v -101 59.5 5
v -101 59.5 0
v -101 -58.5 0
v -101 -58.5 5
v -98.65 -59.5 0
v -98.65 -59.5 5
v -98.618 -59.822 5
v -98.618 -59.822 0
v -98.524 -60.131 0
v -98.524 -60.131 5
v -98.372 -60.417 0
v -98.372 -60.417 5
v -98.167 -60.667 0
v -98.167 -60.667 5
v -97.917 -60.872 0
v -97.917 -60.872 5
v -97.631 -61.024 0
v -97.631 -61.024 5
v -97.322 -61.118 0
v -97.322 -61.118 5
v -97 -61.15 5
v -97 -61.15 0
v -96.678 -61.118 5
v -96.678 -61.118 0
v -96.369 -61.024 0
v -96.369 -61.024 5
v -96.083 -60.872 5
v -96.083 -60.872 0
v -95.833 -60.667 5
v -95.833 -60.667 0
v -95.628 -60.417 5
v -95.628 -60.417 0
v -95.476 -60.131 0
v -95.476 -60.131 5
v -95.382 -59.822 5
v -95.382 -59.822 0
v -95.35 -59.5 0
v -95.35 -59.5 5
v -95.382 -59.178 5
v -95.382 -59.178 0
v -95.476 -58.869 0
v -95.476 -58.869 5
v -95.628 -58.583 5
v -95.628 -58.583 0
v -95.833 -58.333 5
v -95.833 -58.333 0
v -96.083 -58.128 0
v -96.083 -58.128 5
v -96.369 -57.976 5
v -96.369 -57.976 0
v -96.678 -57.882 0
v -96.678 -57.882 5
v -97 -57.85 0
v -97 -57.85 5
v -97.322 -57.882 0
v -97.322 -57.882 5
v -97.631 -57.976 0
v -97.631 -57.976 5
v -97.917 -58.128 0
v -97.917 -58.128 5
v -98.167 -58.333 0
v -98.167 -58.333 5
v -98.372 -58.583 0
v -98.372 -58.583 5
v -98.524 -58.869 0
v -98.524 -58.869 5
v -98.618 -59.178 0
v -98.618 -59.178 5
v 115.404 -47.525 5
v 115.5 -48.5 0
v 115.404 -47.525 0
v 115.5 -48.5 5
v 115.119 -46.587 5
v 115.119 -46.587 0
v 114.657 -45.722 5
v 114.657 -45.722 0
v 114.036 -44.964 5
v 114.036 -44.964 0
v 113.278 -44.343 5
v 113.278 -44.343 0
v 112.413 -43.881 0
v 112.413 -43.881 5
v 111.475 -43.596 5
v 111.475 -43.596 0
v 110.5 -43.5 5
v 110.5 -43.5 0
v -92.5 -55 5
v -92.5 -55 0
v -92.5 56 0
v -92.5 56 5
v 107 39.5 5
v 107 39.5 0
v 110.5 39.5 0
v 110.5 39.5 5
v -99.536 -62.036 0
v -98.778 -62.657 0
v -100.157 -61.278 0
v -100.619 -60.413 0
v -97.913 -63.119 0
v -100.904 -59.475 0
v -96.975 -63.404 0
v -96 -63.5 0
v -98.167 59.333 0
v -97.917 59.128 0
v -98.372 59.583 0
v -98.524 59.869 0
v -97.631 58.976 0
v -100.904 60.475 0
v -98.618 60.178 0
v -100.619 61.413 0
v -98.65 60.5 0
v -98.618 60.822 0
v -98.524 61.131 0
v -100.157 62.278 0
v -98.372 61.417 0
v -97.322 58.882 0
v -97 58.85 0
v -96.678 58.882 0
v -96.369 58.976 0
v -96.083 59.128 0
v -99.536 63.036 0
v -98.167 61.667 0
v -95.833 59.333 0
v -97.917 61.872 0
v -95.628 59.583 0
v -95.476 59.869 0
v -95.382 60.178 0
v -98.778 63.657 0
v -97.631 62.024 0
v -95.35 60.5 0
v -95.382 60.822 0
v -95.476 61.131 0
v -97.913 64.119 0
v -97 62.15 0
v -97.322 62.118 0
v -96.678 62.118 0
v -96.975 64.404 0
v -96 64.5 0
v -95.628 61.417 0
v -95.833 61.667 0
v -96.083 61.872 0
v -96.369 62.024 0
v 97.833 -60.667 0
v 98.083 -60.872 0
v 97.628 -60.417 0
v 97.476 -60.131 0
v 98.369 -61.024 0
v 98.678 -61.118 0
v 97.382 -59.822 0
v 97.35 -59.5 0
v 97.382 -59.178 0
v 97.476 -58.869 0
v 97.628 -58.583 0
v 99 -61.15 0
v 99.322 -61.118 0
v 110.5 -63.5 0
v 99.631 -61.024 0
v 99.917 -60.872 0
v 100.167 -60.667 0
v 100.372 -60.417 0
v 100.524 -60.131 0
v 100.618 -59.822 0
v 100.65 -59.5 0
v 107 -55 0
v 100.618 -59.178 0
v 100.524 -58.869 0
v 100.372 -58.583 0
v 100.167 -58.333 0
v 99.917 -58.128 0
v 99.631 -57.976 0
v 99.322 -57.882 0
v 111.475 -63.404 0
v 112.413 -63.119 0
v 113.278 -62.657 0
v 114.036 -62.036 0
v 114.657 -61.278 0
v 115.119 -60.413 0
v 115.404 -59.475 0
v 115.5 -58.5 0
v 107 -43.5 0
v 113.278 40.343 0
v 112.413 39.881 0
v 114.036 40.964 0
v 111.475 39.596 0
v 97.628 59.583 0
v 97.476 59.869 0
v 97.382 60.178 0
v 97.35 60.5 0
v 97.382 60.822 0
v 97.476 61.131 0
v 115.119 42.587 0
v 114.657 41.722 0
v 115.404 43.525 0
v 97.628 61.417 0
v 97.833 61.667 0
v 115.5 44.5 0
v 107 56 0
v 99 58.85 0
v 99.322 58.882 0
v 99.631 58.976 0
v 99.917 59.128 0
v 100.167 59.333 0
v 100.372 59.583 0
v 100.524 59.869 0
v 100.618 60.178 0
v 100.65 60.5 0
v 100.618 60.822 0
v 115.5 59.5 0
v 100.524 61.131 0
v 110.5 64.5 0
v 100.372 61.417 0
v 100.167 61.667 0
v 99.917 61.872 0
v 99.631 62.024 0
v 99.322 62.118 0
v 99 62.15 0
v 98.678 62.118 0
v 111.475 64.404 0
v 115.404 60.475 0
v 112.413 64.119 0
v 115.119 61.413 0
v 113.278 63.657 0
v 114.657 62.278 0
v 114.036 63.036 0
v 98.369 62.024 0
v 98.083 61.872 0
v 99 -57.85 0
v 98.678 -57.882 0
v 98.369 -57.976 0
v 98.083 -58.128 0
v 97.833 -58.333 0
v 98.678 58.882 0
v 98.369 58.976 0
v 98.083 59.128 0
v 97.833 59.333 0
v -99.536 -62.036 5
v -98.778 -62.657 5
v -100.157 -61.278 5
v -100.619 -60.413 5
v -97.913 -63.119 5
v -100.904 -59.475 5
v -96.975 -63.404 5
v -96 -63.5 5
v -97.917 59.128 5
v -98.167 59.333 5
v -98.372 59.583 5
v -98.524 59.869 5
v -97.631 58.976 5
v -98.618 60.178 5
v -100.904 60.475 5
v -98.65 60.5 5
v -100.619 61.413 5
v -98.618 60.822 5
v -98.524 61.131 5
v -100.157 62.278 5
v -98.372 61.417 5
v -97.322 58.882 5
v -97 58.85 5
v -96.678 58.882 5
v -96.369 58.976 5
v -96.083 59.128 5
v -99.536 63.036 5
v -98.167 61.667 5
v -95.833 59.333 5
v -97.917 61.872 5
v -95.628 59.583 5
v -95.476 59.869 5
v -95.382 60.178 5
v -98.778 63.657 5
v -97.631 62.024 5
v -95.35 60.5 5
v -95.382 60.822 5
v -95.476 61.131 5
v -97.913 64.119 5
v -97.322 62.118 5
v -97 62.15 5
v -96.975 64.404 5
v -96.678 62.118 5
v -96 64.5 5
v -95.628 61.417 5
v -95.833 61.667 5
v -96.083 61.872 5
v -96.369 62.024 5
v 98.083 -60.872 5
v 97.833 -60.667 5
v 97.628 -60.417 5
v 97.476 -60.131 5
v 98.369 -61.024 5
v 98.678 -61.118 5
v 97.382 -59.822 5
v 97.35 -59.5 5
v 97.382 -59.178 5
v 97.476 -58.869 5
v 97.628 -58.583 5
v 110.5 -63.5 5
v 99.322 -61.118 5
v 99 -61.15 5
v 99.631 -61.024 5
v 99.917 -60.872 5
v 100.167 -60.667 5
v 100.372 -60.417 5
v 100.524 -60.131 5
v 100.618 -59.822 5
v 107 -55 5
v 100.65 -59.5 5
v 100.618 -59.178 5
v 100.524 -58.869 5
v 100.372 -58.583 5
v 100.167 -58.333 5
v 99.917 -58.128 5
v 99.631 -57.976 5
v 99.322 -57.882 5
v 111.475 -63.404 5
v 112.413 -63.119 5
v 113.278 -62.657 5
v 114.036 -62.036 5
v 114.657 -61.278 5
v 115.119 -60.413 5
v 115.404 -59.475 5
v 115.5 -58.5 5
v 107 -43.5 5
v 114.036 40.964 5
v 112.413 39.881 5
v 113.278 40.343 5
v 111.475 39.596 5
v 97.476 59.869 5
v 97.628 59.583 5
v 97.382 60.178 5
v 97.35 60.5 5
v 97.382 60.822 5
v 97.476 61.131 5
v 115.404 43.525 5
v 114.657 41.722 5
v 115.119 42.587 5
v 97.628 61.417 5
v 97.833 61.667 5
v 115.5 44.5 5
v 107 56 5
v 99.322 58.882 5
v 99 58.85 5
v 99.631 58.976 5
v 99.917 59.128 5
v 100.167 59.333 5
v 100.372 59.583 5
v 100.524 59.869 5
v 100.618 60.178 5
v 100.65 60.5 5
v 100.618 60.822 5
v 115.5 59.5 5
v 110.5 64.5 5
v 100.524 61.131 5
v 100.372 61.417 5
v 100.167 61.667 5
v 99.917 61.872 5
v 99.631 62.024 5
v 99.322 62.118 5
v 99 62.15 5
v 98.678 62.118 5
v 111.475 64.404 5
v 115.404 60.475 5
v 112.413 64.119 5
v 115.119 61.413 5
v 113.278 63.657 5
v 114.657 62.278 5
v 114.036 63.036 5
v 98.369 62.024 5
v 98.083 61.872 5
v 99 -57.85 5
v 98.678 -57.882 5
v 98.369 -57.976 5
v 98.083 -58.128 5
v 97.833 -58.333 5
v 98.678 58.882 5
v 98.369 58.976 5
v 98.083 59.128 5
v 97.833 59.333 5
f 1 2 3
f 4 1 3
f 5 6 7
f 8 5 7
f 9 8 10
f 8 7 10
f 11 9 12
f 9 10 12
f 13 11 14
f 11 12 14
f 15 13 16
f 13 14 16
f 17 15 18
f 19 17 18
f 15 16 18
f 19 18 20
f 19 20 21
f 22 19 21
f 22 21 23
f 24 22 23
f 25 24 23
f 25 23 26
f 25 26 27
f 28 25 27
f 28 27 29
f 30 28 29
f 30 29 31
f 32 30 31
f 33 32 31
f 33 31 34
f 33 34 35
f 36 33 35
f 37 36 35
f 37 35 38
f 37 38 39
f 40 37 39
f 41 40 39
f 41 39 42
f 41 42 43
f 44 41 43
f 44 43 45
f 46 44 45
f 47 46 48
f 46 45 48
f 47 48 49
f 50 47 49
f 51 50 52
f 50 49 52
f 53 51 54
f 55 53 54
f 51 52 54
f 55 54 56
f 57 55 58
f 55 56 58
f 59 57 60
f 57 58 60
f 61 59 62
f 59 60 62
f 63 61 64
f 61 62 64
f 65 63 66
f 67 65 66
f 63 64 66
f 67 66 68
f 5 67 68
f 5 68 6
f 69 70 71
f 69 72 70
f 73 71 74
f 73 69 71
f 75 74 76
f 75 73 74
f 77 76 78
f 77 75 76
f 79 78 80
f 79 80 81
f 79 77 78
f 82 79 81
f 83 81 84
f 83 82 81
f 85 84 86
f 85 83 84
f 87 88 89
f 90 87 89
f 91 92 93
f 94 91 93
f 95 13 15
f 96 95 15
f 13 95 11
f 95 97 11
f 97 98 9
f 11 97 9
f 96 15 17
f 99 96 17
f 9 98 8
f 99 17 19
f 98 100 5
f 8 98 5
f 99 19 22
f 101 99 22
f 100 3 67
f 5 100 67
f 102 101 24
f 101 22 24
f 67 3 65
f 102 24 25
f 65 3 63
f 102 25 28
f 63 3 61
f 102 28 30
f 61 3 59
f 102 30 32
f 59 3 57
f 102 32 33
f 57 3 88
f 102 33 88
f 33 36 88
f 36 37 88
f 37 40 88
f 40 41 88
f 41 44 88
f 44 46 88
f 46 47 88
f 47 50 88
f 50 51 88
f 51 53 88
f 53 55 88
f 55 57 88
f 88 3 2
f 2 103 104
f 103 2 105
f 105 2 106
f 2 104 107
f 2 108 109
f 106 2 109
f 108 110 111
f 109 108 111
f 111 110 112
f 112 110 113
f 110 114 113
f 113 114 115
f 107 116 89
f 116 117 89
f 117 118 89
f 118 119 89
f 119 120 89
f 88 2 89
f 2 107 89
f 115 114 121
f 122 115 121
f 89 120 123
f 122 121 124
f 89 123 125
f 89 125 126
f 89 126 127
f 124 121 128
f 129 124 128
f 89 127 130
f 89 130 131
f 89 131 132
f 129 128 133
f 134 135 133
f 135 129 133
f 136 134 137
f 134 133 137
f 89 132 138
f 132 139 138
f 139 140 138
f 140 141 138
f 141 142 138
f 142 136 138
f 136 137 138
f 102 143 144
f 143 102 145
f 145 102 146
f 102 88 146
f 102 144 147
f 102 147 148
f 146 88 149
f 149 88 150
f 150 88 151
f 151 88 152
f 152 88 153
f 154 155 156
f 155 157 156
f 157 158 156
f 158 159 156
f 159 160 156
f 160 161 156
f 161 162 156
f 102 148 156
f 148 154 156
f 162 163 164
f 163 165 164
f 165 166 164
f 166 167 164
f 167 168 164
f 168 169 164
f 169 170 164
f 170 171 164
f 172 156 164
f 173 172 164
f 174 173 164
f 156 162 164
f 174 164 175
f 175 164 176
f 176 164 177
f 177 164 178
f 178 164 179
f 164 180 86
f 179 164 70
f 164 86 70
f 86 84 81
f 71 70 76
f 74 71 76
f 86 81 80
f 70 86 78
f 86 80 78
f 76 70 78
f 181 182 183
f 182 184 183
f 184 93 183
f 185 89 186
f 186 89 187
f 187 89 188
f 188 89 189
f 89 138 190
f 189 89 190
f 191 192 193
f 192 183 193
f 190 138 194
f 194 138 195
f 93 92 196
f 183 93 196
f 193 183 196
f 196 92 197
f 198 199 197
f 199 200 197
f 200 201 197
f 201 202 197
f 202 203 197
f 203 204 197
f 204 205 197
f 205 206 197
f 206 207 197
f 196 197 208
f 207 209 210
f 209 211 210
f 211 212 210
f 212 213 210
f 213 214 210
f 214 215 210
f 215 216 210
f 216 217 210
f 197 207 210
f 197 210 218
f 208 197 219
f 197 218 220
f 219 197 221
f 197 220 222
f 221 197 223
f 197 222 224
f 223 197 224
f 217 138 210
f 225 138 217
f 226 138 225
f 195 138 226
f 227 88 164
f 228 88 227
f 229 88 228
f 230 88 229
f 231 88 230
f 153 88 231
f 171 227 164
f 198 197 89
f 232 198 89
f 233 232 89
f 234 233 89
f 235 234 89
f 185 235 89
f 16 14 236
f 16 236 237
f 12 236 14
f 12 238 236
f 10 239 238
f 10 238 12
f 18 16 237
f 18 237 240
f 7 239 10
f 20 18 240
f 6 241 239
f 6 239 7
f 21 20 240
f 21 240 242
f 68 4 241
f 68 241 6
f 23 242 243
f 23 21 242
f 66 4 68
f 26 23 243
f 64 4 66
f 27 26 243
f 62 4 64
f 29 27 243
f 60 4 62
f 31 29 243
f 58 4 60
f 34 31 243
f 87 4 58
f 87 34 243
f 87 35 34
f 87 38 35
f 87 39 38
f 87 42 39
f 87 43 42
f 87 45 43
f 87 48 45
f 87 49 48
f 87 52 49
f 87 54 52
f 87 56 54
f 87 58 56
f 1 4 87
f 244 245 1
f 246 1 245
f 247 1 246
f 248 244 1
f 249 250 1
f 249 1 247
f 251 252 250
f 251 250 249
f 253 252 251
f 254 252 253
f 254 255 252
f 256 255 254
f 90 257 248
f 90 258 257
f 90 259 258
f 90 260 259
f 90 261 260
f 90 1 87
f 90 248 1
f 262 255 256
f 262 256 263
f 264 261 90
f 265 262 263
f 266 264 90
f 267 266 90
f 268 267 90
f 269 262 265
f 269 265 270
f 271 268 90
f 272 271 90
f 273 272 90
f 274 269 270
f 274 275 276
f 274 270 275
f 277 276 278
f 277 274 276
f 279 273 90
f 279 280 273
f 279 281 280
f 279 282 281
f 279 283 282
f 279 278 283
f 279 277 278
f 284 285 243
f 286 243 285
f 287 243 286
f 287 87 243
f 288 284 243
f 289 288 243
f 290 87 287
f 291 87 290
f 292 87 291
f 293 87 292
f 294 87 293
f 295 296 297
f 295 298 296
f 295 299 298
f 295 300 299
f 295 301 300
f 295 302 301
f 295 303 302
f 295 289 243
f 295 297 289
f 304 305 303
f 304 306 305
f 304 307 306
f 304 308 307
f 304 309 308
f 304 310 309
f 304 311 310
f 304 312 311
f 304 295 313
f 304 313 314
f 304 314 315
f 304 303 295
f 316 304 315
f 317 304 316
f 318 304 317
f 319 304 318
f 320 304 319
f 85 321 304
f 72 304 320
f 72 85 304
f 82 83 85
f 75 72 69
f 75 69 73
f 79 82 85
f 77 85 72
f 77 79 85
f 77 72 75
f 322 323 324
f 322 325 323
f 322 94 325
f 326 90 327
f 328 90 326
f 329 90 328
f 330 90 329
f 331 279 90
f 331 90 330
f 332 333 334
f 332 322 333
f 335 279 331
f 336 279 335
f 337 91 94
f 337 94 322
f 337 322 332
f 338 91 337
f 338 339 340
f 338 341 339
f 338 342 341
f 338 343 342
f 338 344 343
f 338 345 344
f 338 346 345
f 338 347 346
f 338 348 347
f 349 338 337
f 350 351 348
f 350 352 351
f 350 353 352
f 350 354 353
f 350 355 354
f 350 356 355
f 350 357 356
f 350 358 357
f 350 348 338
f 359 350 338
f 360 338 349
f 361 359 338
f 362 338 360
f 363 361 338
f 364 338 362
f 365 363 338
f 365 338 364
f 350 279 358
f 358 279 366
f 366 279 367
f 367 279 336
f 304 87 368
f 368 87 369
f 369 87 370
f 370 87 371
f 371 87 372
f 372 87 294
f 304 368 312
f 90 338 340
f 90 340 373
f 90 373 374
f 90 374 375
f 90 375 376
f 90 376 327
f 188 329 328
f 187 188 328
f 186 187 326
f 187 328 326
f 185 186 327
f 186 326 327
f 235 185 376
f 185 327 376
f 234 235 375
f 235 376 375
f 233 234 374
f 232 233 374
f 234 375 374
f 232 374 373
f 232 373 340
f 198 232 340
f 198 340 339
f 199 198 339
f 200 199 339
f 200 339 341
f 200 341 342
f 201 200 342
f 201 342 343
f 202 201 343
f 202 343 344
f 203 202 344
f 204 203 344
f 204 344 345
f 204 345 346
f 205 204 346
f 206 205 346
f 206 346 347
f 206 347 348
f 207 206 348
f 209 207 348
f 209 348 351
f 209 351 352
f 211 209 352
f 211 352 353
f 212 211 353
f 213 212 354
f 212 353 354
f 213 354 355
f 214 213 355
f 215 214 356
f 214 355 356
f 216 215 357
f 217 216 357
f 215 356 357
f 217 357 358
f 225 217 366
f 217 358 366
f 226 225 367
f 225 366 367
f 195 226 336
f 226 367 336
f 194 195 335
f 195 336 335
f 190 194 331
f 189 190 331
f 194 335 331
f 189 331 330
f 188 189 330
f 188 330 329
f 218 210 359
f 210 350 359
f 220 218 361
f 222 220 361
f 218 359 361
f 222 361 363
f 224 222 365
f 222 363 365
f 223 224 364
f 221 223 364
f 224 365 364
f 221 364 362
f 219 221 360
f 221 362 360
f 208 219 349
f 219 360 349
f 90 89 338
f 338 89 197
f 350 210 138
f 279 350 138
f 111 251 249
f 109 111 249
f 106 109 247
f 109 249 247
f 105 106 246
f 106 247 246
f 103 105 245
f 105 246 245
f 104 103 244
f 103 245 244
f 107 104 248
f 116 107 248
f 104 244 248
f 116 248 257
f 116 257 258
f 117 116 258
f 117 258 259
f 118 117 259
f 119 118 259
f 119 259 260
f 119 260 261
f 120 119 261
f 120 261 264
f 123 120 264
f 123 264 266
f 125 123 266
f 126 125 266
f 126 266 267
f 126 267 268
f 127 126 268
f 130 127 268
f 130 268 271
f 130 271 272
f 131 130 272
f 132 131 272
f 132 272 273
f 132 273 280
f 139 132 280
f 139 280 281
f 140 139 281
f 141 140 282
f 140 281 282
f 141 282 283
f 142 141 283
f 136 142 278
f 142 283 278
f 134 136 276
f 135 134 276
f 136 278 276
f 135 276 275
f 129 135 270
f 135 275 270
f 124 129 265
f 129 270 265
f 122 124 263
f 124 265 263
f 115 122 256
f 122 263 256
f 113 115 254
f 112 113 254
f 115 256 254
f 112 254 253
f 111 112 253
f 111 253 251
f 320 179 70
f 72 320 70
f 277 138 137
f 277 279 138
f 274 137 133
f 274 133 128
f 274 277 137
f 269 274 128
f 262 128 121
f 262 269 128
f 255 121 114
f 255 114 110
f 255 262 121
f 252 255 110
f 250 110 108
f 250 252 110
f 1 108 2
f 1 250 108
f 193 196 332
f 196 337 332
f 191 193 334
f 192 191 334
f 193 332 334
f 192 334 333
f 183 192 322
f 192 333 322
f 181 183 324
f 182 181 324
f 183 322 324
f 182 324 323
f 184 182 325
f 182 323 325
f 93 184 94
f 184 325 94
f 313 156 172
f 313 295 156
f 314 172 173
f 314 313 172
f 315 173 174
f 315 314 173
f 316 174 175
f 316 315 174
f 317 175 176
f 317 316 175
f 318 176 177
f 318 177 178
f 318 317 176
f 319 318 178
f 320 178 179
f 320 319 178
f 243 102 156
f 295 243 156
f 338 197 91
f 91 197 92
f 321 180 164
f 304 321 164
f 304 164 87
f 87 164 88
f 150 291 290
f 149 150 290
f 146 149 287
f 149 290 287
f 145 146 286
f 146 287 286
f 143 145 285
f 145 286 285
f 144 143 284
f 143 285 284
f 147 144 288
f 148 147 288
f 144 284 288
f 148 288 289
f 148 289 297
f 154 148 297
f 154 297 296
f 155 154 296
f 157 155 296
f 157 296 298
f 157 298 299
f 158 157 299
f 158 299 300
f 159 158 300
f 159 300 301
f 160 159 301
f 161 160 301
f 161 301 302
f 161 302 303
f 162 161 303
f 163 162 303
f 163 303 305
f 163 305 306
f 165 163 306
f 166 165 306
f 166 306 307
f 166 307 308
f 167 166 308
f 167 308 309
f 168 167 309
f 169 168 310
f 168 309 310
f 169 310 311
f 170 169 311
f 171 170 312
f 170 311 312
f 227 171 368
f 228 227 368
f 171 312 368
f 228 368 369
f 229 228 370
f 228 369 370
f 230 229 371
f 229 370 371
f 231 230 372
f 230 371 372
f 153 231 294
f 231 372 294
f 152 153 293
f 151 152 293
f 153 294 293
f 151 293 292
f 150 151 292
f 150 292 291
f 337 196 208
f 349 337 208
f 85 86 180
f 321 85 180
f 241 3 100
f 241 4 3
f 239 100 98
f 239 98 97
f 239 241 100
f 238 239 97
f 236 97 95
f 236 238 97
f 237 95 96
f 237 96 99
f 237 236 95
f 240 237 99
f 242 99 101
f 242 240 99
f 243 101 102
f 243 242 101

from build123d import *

# Parameters (mm, degrees)
F1_DEPTH = 5
F2_D     = 3.3
F3_R     = 5


with BuildPart() as f1:
    # F0 (on Top) → F1 (new body)
    with BuildSketch(Plane.XY):
        Polygon((115.4999993443, 64.5), (103, 64.5), (-101, 64.5), (-101, -63.5), (103, -63.5), (115.4999993443, -63.5), (115.4999993443, -43.5), (106.9999993443, -43.5), (106.9999993443, -55), (103, -55), (-92.5, -55), (-92.5, 56), (103, 56), (106.9999993443, 56), (106.9999993443, 39.5), (115.4999993443, 39.5), align=None)
    extrude(amount=F1_DEPTH)

    # F2 (through all)
    with Locations(Plane(origin=(0, 0, 0), x_dir=(1, 0, 0), z_dir=(0, 0, -1))):
        with Locations((-97, -60.5), (99, -60.5), (99, 59.5), (-97, 59.5)):
            Hole(F2_D / 2)

    # F3
    f3_edges = [f1.edges().sort_by_distance(p)[0] for p in [
        (115.499999, 39.5, 2.5),
        (115.499999, 64.5, 2.5),
        (-101, 64.5, 2.5),
        (-101, -63.5, 2.5),
        (115.499999, -63.5, 2.5),
        (115.499999, -43.5, 2.5),
    ]]
    fillet(f3_edges, radius=F3_R)


solid = f1.part
